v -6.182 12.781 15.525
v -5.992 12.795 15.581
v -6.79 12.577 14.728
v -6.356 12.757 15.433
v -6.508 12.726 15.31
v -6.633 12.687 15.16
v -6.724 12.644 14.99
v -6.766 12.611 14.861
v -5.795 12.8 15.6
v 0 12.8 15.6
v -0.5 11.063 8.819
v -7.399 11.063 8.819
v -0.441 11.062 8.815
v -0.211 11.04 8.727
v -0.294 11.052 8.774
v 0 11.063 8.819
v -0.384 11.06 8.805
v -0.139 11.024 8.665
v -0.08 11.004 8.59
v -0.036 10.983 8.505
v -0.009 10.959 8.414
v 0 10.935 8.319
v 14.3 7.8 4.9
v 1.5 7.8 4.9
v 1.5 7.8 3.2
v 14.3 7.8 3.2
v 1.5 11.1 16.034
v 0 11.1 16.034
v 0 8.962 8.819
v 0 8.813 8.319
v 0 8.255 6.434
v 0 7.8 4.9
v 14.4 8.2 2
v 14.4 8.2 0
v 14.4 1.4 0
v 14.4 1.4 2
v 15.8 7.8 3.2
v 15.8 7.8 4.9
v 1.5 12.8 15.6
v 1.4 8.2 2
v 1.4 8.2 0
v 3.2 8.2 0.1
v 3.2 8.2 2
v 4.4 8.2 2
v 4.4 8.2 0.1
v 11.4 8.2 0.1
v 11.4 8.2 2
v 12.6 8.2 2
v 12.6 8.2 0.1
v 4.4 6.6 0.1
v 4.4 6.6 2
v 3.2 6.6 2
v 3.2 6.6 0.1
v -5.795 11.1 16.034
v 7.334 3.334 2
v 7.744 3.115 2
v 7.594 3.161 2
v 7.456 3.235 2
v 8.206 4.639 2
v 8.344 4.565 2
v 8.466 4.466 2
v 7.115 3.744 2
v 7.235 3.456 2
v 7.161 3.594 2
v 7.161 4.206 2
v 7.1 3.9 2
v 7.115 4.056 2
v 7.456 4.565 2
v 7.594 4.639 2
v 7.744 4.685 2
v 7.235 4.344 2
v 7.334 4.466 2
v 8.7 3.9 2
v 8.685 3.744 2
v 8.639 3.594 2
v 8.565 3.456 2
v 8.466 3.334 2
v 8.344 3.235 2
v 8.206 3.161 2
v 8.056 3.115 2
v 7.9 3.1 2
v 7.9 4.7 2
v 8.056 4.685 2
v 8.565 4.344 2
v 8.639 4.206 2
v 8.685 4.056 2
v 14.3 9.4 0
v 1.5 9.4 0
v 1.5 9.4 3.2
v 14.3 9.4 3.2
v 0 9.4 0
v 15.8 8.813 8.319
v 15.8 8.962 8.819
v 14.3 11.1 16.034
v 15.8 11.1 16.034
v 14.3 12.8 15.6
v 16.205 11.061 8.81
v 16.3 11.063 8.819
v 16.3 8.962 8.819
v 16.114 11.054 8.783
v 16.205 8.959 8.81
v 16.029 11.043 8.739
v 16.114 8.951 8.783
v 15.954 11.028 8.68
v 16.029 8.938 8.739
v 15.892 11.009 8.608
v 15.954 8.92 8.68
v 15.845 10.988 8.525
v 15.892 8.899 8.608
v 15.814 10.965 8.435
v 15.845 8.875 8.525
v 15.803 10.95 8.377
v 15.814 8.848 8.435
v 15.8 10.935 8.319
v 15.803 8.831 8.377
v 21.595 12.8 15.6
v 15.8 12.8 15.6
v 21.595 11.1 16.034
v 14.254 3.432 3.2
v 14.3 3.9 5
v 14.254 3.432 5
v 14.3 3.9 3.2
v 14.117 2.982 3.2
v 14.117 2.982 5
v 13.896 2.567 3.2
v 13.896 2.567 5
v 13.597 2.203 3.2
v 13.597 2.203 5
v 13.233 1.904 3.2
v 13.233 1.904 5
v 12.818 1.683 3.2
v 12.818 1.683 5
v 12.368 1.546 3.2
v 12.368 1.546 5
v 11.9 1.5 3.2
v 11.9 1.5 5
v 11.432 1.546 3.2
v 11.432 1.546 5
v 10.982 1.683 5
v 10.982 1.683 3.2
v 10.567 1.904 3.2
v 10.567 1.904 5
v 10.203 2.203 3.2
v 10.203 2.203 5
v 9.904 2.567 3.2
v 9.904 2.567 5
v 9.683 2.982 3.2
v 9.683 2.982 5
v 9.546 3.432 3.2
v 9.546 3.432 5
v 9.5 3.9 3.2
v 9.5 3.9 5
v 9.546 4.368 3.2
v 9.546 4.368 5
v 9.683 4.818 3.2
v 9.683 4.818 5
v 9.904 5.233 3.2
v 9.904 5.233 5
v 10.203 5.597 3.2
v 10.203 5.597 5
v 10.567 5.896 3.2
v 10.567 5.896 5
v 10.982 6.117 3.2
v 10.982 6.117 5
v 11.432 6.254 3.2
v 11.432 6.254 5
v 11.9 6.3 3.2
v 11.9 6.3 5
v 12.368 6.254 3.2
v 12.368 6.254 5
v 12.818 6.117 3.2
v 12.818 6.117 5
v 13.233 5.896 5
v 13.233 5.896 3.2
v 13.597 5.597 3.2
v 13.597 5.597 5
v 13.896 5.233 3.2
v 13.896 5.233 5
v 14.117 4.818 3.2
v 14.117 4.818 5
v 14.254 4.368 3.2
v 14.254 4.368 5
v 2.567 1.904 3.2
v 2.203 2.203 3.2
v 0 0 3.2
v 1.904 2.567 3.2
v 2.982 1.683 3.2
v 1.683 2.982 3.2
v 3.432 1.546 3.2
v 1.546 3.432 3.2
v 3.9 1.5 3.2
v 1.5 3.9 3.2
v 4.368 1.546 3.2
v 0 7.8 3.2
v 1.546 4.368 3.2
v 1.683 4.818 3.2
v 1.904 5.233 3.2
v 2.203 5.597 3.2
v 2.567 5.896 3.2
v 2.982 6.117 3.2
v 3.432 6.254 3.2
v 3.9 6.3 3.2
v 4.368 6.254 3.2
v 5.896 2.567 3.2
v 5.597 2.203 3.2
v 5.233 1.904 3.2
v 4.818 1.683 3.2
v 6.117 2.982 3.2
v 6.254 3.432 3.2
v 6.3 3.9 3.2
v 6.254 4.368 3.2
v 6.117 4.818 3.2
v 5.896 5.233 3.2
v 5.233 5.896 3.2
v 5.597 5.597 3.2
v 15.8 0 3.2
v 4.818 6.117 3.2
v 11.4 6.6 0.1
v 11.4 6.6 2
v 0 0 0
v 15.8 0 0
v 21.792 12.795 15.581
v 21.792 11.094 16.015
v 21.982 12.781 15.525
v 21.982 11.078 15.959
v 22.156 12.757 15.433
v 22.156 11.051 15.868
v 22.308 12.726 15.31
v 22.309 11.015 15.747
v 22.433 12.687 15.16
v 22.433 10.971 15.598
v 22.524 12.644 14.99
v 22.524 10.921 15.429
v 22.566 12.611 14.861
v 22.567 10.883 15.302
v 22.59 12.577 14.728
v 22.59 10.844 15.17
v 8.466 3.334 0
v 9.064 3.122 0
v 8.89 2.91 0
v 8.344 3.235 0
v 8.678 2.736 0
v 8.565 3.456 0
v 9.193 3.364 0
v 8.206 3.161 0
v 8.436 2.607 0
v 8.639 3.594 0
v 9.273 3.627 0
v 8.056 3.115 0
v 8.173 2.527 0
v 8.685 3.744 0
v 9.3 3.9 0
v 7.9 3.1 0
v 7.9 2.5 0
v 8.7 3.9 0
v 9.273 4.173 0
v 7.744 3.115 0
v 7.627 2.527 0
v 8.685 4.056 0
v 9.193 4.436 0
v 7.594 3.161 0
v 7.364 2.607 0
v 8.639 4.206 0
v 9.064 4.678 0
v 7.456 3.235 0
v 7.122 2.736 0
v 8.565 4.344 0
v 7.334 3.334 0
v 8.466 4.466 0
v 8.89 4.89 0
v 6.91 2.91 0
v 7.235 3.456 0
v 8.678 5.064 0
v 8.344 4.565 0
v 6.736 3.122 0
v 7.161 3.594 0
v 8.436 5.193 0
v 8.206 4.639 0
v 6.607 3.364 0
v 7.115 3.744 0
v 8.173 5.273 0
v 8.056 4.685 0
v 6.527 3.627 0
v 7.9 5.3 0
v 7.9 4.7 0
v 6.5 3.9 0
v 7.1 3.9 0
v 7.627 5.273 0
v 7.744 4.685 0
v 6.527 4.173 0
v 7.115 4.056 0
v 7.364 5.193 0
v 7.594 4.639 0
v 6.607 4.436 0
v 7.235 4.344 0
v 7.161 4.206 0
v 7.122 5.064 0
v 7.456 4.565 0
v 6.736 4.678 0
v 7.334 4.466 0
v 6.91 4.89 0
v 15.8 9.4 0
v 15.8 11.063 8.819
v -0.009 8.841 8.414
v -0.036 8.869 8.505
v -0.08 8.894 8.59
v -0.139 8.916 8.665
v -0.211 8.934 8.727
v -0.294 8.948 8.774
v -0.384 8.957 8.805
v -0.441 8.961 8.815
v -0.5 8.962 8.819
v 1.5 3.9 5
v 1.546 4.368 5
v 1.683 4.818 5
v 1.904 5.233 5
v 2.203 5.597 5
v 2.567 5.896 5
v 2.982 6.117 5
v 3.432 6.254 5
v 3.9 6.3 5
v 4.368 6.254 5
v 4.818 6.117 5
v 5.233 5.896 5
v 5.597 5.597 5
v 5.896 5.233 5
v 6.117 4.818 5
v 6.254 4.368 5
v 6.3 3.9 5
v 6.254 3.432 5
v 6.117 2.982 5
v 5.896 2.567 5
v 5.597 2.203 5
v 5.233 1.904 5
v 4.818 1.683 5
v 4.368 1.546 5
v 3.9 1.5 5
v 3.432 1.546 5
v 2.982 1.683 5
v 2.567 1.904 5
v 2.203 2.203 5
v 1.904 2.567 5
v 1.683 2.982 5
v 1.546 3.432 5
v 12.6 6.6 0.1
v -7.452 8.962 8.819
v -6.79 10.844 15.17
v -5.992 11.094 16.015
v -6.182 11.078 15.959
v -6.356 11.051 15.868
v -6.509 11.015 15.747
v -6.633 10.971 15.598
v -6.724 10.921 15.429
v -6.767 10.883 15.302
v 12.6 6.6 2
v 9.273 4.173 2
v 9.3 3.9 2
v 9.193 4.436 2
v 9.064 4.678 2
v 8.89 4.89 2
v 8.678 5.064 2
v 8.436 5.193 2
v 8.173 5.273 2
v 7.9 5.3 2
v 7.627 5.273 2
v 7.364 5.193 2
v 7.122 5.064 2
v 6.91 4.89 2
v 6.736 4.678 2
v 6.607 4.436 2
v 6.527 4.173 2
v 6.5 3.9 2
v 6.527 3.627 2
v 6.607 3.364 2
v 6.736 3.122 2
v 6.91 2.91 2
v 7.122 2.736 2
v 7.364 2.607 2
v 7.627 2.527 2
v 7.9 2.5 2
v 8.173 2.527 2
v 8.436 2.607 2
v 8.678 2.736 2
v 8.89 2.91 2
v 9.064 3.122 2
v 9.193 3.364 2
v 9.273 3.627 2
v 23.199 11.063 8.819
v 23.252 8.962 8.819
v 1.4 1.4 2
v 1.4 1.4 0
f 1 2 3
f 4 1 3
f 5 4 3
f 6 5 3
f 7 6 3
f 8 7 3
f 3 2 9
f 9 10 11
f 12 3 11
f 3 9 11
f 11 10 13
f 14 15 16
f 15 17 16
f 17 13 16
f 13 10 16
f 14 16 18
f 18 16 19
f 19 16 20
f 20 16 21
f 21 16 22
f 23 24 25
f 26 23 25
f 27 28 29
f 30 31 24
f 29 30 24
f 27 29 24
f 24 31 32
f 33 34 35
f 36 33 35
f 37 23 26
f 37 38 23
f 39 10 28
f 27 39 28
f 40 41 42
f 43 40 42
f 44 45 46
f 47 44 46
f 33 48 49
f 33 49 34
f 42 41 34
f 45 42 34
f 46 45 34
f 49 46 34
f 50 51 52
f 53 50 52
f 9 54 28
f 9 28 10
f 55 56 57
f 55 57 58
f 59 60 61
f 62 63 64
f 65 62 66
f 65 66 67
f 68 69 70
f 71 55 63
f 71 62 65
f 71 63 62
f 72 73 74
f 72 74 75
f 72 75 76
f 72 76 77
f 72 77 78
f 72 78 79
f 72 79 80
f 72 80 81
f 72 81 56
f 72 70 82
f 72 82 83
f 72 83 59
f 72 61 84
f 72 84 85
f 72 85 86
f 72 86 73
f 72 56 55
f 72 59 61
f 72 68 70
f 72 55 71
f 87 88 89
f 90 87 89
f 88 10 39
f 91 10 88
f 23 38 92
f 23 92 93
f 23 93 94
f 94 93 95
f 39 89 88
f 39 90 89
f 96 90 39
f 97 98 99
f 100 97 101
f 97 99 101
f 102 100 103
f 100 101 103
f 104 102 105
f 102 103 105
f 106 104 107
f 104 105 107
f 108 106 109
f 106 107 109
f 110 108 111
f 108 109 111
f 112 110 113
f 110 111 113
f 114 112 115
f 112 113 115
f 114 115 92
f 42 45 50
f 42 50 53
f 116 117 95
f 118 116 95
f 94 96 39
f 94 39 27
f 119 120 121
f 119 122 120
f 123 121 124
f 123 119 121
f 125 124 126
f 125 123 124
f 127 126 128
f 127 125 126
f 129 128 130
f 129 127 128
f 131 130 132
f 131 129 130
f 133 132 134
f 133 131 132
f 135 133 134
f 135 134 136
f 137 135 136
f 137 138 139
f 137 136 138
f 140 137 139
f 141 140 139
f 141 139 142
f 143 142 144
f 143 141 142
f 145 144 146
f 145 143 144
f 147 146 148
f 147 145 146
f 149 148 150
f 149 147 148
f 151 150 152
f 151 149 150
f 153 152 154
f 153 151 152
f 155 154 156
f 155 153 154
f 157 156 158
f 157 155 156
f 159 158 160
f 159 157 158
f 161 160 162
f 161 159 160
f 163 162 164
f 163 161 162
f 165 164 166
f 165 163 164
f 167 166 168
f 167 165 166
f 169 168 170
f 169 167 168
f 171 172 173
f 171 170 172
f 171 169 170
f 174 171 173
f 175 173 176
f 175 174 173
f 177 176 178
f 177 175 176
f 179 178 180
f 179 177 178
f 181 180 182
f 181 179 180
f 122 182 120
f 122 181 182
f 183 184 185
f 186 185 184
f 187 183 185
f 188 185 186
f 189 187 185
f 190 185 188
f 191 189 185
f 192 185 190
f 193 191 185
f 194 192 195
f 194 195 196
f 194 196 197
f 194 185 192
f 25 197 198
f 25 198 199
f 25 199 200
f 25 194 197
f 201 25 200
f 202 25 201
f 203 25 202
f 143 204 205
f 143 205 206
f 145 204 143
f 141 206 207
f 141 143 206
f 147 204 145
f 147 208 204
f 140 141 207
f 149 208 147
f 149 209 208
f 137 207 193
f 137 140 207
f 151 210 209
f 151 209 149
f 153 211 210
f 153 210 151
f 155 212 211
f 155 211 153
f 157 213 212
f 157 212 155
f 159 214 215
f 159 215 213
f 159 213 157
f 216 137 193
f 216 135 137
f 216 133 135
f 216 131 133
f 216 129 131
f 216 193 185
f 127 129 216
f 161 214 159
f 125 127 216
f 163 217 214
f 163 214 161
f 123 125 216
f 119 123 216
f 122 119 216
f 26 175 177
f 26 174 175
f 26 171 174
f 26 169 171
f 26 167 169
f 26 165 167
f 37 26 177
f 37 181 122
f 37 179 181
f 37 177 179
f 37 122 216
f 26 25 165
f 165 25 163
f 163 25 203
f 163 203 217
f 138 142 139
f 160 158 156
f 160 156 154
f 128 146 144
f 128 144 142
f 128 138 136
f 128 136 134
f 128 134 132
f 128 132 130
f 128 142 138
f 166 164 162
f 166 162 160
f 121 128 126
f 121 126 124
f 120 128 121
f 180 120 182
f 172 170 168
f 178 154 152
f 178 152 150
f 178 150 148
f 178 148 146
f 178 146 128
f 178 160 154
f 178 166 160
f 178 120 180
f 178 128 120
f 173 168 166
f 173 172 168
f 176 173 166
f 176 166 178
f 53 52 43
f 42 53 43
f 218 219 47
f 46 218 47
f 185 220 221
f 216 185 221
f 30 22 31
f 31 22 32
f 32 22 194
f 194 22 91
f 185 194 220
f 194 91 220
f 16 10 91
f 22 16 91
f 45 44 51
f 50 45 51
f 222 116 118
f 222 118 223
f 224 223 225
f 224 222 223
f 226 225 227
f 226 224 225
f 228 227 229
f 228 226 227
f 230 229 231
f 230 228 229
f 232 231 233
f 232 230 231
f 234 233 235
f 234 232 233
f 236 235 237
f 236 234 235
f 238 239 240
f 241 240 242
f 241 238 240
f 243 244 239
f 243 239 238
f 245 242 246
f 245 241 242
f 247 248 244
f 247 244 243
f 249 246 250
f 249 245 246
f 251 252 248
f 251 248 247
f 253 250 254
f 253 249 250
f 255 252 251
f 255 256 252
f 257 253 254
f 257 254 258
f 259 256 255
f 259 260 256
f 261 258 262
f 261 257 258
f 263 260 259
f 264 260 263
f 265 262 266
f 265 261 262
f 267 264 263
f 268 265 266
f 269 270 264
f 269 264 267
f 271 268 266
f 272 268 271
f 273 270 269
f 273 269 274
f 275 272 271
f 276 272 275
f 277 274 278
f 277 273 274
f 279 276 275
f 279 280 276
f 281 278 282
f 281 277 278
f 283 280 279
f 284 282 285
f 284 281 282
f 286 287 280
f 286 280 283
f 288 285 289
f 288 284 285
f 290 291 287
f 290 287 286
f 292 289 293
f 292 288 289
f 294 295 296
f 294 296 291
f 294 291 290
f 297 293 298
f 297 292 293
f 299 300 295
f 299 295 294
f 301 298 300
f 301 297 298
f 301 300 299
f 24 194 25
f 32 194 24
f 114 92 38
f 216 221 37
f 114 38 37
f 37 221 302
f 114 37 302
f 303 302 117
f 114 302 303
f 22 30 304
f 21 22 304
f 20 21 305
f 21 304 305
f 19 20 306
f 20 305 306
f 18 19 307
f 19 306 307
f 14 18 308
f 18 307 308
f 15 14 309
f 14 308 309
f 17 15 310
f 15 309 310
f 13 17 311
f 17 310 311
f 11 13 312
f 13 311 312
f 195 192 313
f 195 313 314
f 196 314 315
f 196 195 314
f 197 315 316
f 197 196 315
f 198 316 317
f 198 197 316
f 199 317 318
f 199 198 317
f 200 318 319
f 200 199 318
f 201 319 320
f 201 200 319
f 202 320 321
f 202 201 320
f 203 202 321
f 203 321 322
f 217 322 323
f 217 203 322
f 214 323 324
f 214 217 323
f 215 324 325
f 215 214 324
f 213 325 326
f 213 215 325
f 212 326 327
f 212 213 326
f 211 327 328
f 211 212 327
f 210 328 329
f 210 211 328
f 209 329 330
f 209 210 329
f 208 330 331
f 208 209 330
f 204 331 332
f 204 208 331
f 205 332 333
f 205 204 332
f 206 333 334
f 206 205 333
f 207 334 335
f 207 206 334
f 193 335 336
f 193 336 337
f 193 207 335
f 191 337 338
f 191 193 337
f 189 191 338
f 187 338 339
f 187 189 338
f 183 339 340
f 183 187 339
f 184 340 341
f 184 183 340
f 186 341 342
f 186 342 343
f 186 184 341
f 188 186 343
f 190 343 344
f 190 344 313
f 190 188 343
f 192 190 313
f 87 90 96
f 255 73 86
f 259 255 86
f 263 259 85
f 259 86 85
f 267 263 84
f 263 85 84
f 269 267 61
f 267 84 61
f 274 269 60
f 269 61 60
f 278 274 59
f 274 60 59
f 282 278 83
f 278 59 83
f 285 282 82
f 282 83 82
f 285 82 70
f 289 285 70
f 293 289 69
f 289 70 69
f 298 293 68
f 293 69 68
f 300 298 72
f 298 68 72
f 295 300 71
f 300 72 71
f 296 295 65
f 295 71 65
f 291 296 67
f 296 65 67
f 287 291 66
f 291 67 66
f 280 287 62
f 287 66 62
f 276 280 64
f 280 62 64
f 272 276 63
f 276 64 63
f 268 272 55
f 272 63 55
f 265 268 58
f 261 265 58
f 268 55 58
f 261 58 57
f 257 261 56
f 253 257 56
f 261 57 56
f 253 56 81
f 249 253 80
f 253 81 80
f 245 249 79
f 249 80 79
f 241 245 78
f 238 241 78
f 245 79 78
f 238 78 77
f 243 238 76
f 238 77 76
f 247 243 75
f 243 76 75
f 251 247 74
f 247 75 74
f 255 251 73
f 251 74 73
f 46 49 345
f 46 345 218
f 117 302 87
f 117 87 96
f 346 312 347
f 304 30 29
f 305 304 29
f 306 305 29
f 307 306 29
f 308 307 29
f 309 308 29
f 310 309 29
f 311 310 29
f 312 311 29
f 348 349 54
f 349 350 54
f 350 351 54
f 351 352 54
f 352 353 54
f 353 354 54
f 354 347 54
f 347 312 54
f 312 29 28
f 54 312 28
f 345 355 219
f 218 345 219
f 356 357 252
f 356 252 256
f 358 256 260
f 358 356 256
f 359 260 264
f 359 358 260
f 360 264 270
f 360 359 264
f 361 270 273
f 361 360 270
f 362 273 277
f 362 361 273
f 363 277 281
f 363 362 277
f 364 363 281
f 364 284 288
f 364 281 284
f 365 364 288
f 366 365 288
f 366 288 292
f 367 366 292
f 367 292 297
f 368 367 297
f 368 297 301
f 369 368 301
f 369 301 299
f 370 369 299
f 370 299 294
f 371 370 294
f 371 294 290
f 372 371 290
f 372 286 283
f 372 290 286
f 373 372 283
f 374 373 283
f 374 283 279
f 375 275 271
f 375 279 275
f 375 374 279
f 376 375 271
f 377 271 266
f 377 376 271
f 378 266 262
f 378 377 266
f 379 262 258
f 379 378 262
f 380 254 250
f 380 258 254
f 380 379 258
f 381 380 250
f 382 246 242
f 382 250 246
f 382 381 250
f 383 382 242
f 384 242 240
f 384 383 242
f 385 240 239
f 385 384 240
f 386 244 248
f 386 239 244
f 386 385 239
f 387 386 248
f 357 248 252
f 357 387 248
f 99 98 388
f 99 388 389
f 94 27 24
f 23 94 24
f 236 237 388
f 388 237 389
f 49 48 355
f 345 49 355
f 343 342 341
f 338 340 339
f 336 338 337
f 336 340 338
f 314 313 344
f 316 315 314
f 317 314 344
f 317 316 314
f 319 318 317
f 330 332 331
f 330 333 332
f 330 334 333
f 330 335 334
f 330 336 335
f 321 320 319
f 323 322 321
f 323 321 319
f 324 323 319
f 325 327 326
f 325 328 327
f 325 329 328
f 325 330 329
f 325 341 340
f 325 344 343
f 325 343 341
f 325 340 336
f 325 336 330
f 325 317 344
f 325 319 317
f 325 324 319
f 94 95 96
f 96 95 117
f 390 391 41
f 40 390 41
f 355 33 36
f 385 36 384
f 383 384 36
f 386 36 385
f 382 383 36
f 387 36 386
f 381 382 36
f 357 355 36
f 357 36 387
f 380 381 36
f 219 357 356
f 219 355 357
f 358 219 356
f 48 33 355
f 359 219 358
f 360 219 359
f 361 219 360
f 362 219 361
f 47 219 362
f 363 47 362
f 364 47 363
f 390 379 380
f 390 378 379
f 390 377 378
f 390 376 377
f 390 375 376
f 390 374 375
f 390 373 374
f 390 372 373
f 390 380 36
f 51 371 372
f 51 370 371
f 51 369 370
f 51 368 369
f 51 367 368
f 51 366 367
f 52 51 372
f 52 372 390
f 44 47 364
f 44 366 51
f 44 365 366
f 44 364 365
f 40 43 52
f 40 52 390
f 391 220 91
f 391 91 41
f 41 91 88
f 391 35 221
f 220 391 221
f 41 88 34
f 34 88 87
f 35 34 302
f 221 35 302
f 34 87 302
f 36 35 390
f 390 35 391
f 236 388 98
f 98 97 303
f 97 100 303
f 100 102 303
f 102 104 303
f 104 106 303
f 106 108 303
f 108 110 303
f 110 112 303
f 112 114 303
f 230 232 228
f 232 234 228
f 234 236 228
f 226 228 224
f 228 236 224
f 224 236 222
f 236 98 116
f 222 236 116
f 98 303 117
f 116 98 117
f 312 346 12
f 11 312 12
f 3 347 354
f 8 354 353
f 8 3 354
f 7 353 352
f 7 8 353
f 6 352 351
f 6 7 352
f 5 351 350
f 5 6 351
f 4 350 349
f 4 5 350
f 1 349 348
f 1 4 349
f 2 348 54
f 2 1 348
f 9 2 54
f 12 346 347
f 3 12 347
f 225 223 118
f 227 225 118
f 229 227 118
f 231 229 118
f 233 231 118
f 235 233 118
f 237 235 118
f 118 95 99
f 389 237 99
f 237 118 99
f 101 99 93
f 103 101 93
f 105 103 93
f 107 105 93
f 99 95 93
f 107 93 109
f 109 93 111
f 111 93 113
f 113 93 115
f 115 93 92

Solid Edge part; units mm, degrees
sketch "Sketch1" plane through (0, 0, 0) normal (0, 0, 1) x (1, 0, 0)
  line L0 (0, 0) -> (15.8, 0)
  line L1 (15.8, 0) -> (15.8, 7.8)
  line L2 (15.8, 7.8) -> (0, 7.8)
  line L3 (0, 7.8) -> (0, 0)
extrude "Protrusion1" add sketch "Sketch1" along normal blind 3.2
sketch "Sketch2" plane through (7.9, 3.9, 3.2) normal (0, 0, 1) x (1, 0, 0)
  circle A0 centre (4, 0) radius 2.4
  dimension "D1" = 4.8
  dimension "D2" = 3.9
extrude "ExtrudedProtrusion_2" add sketch "Sketch2" along normal blind 1.8
mirror "Mirror1" about plane through (7.9, 0, 0) normal (1, 0, 0) of "ExtrudedProtrusion_2"
sketch "Sketch3" plane through (7.9, 3.9, 0) normal (0, 0, -1) x (1, 0, 0)
  line L0 (-6.5, -2.5) -> (6.5, -2.5)
  line L1 (6.5, -2.5) -> (6.5, 2.5)
  line L2 (6.5, 2.5) -> (-6.5, 2.5)
  line L3 (-6.5, 2.5) -> (-6.5, -2.5)
extrude "ExtrudedCutout_1" cut sketch "Sketch3" against normal blind 2
sketch "Sketch4" plane through (7.9, 3.9, 2) normal (0, 0, -1) x (1, 0, 0)
  circle A0 centre (0, 0) radius 1.4
extrude "ExtrudedProtrusion_3" add sketch "Sketch4" along normal blind 2
sketch "Sketch5" plane through (7.9, 3.9, 2) normal (0, 0, -1) x (1, 0, 0)
  circle A0 centre (0, 0) radius 0.8
extrude "ExtrudedCutout_2" cut sketch "Sketch5" along normal blind 20
sketch "Sketch6" plane through (15.8, 3.9, 1.6) normal (1, 0, 0) x (0, 1, 0)
  line L0 (3.9, 3.3) -> (7.2, 14.4339)
  line L1 (7.2, 14.4339) -> (8.9, 14)
  line L2 (5.5, -1.6) -> (8.9, 14)
  line L3 (3.9, -1.6) -> (5.5, -1.6)
  line L4 (3.9, 3.3) -> (3.9, -1.6)
extrude "ExtrudedProtrusion_4" add sketch "Sketch6" against normal blind 1.5
sketch "Sketch7" plane through (15.8, 6.4, 8.0169) normal (1, 0, 0) x (0, 1, 0)
  line L0 (3, -8.0169) -> (3, -4.8169)
  line L1 (3, -4.8169) -> (1.4, -4.8169)
  line L2 (1.4, -4.8169) -> (1.4, -8.0169)
  line L3 (1.4, -8.0169) -> (3, -8.0169)
extrude "ExtrudedProtrusion_5" add sketch "Sketch7" against normal blind 15.8
sketch "Sketch8" plane through (14.3, 10.3, 8.0169) normal (-1, 0, 0) x (0, -0.2129497, -0.9770632)
  line L0 (4.8981, -0.1464) -> (-7.9415, -0.8278)
  line L1 (-7.9415, -0.8278) -> (-8.0034, 0.9256)
  line L2 (-8.0034, 0.9256) -> (3.5778, 1.7789)
  line L3 (3.5778, 1.7789) -> (5.2388, 1.4169)
  line L4 (5.2388, 1.4169) -> (4.8981, -0.1464)
extrude "ExtrudedProtrusion_6" add sketch "Sketch8" along normal blind 7.9
sketch "Sketch9" plane through (15.8, 6.4, 8.0169) normal (1, 0, 0) x (0, 0.2129497, 0.9770632)
  line L0 (-1.1517, -2.1492) -> (-0.6837, -4.2964)
  line L1 (-0.6837, -4.2964) -> (8.772, -4.6384)
  line L2 (8.772, -4.6384) -> (8.8339, -2.885)
  line L3 (8.8339, -2.885) -> (-1.1517, -2.1492)
extrude "Protrusion2" add sketch "Sketch9" along normal blind 7.7
sketch "Sketch10" plane through (19.65, 11.6261, 11.017) normal (0, 0.9687267, -0.2481301) x (0, -0.2481301, -0.9687267)
  line L0 (-4.7309, -3.85) -> (-4.7309, -2.85)
  line L1 (-4.7309, -2.85) -> (5.2762, -3.85)
  line L2 (5.2762, -3.85) -> (-4.7309, -3.85)
extrude "ExtrudedCutout_6" cut sketch "Sketch10" along normal mid plane 40
fillet "Round_2" radius 1 1 edges at (22.5001, 11.95, 15.8169)
fillet "Round_3" radius 0.2 1 edges at (23.4728, 9.3535, 6.434)
mirror "Mirror2" about plane through (7.9, 0, 0) normal (1, 0, 0) of "Protrusion2", "Round_2", "ExtrudedCutout_6", "ExtrudedProtrusion_4", "ExtrudedProtrusion_6", "Round_3"
sketch "Sketch11" plane through (15.8, 6.4, 7.8) normal (1, 0, 0) x (0, 1, 0)
  line L0 (4.6631, 1.0189) -> (2.5615, 1.0189)
  line L1 (2.5615, 1.0189) -> (1.8547, -1.366)
  line L2 (1.8547, -1.366) -> (4.0522, -1.366)
  line L3 (4.0522, -1.366) -> (4.6631, 1.0189)
extrude "ExtrudedCutout_7" cut sketch "Sketch11" along normal blind 20
mirror "Mirror3" about plane through (7.9, 0, 0) normal (1, 0, 0) of "ExtrudedCutout_7"
sketch "Sketch12" plane through (7.9, 4.7, 0) normal (0, 0, -1) x (1, 0, 0)
  line L0 (6.5, -3.5) -> (6.5, -1.7)
  line L1 (6.5, -1.7) -> (-6.5, -1.7)
  line L2 (-6.5, -1.7) -> (-6.5, -3.5)
  line L3 (-6.5, -3.5) -> (6.5, -3.5)
extrude "ExtrudedCutout_9" cut sketch "Sketch12" against normal blind 2
sketch "Sketch13" plane through (7.9, 4.8, 2) normal (0, 0, -1) x (1, 0, 0)
  line L0 (3.5, -3.4) -> (4.7, -3.4)
  line L1 (4.7, -3.4) -> (4.7, -1.8)
  line L2 (4.7, -1.8) -> (3.5, -1.8)
  line L3 (3.5, -1.8) -> (3.5, -3.4)
extrude "ExtrudedProtrusion_9" add sketch "Sketch13" along normal blind 1.9
mirror "Mirror4" about plane through (7.9, 0, 0) normal (1, 0, 0) of "ExtrudedProtrusion_9"
fillet "Round_4" radius 0.5 2 edges at (0, 10.0123, 8.8189) (15.8, 10.0123, 8.8189)
